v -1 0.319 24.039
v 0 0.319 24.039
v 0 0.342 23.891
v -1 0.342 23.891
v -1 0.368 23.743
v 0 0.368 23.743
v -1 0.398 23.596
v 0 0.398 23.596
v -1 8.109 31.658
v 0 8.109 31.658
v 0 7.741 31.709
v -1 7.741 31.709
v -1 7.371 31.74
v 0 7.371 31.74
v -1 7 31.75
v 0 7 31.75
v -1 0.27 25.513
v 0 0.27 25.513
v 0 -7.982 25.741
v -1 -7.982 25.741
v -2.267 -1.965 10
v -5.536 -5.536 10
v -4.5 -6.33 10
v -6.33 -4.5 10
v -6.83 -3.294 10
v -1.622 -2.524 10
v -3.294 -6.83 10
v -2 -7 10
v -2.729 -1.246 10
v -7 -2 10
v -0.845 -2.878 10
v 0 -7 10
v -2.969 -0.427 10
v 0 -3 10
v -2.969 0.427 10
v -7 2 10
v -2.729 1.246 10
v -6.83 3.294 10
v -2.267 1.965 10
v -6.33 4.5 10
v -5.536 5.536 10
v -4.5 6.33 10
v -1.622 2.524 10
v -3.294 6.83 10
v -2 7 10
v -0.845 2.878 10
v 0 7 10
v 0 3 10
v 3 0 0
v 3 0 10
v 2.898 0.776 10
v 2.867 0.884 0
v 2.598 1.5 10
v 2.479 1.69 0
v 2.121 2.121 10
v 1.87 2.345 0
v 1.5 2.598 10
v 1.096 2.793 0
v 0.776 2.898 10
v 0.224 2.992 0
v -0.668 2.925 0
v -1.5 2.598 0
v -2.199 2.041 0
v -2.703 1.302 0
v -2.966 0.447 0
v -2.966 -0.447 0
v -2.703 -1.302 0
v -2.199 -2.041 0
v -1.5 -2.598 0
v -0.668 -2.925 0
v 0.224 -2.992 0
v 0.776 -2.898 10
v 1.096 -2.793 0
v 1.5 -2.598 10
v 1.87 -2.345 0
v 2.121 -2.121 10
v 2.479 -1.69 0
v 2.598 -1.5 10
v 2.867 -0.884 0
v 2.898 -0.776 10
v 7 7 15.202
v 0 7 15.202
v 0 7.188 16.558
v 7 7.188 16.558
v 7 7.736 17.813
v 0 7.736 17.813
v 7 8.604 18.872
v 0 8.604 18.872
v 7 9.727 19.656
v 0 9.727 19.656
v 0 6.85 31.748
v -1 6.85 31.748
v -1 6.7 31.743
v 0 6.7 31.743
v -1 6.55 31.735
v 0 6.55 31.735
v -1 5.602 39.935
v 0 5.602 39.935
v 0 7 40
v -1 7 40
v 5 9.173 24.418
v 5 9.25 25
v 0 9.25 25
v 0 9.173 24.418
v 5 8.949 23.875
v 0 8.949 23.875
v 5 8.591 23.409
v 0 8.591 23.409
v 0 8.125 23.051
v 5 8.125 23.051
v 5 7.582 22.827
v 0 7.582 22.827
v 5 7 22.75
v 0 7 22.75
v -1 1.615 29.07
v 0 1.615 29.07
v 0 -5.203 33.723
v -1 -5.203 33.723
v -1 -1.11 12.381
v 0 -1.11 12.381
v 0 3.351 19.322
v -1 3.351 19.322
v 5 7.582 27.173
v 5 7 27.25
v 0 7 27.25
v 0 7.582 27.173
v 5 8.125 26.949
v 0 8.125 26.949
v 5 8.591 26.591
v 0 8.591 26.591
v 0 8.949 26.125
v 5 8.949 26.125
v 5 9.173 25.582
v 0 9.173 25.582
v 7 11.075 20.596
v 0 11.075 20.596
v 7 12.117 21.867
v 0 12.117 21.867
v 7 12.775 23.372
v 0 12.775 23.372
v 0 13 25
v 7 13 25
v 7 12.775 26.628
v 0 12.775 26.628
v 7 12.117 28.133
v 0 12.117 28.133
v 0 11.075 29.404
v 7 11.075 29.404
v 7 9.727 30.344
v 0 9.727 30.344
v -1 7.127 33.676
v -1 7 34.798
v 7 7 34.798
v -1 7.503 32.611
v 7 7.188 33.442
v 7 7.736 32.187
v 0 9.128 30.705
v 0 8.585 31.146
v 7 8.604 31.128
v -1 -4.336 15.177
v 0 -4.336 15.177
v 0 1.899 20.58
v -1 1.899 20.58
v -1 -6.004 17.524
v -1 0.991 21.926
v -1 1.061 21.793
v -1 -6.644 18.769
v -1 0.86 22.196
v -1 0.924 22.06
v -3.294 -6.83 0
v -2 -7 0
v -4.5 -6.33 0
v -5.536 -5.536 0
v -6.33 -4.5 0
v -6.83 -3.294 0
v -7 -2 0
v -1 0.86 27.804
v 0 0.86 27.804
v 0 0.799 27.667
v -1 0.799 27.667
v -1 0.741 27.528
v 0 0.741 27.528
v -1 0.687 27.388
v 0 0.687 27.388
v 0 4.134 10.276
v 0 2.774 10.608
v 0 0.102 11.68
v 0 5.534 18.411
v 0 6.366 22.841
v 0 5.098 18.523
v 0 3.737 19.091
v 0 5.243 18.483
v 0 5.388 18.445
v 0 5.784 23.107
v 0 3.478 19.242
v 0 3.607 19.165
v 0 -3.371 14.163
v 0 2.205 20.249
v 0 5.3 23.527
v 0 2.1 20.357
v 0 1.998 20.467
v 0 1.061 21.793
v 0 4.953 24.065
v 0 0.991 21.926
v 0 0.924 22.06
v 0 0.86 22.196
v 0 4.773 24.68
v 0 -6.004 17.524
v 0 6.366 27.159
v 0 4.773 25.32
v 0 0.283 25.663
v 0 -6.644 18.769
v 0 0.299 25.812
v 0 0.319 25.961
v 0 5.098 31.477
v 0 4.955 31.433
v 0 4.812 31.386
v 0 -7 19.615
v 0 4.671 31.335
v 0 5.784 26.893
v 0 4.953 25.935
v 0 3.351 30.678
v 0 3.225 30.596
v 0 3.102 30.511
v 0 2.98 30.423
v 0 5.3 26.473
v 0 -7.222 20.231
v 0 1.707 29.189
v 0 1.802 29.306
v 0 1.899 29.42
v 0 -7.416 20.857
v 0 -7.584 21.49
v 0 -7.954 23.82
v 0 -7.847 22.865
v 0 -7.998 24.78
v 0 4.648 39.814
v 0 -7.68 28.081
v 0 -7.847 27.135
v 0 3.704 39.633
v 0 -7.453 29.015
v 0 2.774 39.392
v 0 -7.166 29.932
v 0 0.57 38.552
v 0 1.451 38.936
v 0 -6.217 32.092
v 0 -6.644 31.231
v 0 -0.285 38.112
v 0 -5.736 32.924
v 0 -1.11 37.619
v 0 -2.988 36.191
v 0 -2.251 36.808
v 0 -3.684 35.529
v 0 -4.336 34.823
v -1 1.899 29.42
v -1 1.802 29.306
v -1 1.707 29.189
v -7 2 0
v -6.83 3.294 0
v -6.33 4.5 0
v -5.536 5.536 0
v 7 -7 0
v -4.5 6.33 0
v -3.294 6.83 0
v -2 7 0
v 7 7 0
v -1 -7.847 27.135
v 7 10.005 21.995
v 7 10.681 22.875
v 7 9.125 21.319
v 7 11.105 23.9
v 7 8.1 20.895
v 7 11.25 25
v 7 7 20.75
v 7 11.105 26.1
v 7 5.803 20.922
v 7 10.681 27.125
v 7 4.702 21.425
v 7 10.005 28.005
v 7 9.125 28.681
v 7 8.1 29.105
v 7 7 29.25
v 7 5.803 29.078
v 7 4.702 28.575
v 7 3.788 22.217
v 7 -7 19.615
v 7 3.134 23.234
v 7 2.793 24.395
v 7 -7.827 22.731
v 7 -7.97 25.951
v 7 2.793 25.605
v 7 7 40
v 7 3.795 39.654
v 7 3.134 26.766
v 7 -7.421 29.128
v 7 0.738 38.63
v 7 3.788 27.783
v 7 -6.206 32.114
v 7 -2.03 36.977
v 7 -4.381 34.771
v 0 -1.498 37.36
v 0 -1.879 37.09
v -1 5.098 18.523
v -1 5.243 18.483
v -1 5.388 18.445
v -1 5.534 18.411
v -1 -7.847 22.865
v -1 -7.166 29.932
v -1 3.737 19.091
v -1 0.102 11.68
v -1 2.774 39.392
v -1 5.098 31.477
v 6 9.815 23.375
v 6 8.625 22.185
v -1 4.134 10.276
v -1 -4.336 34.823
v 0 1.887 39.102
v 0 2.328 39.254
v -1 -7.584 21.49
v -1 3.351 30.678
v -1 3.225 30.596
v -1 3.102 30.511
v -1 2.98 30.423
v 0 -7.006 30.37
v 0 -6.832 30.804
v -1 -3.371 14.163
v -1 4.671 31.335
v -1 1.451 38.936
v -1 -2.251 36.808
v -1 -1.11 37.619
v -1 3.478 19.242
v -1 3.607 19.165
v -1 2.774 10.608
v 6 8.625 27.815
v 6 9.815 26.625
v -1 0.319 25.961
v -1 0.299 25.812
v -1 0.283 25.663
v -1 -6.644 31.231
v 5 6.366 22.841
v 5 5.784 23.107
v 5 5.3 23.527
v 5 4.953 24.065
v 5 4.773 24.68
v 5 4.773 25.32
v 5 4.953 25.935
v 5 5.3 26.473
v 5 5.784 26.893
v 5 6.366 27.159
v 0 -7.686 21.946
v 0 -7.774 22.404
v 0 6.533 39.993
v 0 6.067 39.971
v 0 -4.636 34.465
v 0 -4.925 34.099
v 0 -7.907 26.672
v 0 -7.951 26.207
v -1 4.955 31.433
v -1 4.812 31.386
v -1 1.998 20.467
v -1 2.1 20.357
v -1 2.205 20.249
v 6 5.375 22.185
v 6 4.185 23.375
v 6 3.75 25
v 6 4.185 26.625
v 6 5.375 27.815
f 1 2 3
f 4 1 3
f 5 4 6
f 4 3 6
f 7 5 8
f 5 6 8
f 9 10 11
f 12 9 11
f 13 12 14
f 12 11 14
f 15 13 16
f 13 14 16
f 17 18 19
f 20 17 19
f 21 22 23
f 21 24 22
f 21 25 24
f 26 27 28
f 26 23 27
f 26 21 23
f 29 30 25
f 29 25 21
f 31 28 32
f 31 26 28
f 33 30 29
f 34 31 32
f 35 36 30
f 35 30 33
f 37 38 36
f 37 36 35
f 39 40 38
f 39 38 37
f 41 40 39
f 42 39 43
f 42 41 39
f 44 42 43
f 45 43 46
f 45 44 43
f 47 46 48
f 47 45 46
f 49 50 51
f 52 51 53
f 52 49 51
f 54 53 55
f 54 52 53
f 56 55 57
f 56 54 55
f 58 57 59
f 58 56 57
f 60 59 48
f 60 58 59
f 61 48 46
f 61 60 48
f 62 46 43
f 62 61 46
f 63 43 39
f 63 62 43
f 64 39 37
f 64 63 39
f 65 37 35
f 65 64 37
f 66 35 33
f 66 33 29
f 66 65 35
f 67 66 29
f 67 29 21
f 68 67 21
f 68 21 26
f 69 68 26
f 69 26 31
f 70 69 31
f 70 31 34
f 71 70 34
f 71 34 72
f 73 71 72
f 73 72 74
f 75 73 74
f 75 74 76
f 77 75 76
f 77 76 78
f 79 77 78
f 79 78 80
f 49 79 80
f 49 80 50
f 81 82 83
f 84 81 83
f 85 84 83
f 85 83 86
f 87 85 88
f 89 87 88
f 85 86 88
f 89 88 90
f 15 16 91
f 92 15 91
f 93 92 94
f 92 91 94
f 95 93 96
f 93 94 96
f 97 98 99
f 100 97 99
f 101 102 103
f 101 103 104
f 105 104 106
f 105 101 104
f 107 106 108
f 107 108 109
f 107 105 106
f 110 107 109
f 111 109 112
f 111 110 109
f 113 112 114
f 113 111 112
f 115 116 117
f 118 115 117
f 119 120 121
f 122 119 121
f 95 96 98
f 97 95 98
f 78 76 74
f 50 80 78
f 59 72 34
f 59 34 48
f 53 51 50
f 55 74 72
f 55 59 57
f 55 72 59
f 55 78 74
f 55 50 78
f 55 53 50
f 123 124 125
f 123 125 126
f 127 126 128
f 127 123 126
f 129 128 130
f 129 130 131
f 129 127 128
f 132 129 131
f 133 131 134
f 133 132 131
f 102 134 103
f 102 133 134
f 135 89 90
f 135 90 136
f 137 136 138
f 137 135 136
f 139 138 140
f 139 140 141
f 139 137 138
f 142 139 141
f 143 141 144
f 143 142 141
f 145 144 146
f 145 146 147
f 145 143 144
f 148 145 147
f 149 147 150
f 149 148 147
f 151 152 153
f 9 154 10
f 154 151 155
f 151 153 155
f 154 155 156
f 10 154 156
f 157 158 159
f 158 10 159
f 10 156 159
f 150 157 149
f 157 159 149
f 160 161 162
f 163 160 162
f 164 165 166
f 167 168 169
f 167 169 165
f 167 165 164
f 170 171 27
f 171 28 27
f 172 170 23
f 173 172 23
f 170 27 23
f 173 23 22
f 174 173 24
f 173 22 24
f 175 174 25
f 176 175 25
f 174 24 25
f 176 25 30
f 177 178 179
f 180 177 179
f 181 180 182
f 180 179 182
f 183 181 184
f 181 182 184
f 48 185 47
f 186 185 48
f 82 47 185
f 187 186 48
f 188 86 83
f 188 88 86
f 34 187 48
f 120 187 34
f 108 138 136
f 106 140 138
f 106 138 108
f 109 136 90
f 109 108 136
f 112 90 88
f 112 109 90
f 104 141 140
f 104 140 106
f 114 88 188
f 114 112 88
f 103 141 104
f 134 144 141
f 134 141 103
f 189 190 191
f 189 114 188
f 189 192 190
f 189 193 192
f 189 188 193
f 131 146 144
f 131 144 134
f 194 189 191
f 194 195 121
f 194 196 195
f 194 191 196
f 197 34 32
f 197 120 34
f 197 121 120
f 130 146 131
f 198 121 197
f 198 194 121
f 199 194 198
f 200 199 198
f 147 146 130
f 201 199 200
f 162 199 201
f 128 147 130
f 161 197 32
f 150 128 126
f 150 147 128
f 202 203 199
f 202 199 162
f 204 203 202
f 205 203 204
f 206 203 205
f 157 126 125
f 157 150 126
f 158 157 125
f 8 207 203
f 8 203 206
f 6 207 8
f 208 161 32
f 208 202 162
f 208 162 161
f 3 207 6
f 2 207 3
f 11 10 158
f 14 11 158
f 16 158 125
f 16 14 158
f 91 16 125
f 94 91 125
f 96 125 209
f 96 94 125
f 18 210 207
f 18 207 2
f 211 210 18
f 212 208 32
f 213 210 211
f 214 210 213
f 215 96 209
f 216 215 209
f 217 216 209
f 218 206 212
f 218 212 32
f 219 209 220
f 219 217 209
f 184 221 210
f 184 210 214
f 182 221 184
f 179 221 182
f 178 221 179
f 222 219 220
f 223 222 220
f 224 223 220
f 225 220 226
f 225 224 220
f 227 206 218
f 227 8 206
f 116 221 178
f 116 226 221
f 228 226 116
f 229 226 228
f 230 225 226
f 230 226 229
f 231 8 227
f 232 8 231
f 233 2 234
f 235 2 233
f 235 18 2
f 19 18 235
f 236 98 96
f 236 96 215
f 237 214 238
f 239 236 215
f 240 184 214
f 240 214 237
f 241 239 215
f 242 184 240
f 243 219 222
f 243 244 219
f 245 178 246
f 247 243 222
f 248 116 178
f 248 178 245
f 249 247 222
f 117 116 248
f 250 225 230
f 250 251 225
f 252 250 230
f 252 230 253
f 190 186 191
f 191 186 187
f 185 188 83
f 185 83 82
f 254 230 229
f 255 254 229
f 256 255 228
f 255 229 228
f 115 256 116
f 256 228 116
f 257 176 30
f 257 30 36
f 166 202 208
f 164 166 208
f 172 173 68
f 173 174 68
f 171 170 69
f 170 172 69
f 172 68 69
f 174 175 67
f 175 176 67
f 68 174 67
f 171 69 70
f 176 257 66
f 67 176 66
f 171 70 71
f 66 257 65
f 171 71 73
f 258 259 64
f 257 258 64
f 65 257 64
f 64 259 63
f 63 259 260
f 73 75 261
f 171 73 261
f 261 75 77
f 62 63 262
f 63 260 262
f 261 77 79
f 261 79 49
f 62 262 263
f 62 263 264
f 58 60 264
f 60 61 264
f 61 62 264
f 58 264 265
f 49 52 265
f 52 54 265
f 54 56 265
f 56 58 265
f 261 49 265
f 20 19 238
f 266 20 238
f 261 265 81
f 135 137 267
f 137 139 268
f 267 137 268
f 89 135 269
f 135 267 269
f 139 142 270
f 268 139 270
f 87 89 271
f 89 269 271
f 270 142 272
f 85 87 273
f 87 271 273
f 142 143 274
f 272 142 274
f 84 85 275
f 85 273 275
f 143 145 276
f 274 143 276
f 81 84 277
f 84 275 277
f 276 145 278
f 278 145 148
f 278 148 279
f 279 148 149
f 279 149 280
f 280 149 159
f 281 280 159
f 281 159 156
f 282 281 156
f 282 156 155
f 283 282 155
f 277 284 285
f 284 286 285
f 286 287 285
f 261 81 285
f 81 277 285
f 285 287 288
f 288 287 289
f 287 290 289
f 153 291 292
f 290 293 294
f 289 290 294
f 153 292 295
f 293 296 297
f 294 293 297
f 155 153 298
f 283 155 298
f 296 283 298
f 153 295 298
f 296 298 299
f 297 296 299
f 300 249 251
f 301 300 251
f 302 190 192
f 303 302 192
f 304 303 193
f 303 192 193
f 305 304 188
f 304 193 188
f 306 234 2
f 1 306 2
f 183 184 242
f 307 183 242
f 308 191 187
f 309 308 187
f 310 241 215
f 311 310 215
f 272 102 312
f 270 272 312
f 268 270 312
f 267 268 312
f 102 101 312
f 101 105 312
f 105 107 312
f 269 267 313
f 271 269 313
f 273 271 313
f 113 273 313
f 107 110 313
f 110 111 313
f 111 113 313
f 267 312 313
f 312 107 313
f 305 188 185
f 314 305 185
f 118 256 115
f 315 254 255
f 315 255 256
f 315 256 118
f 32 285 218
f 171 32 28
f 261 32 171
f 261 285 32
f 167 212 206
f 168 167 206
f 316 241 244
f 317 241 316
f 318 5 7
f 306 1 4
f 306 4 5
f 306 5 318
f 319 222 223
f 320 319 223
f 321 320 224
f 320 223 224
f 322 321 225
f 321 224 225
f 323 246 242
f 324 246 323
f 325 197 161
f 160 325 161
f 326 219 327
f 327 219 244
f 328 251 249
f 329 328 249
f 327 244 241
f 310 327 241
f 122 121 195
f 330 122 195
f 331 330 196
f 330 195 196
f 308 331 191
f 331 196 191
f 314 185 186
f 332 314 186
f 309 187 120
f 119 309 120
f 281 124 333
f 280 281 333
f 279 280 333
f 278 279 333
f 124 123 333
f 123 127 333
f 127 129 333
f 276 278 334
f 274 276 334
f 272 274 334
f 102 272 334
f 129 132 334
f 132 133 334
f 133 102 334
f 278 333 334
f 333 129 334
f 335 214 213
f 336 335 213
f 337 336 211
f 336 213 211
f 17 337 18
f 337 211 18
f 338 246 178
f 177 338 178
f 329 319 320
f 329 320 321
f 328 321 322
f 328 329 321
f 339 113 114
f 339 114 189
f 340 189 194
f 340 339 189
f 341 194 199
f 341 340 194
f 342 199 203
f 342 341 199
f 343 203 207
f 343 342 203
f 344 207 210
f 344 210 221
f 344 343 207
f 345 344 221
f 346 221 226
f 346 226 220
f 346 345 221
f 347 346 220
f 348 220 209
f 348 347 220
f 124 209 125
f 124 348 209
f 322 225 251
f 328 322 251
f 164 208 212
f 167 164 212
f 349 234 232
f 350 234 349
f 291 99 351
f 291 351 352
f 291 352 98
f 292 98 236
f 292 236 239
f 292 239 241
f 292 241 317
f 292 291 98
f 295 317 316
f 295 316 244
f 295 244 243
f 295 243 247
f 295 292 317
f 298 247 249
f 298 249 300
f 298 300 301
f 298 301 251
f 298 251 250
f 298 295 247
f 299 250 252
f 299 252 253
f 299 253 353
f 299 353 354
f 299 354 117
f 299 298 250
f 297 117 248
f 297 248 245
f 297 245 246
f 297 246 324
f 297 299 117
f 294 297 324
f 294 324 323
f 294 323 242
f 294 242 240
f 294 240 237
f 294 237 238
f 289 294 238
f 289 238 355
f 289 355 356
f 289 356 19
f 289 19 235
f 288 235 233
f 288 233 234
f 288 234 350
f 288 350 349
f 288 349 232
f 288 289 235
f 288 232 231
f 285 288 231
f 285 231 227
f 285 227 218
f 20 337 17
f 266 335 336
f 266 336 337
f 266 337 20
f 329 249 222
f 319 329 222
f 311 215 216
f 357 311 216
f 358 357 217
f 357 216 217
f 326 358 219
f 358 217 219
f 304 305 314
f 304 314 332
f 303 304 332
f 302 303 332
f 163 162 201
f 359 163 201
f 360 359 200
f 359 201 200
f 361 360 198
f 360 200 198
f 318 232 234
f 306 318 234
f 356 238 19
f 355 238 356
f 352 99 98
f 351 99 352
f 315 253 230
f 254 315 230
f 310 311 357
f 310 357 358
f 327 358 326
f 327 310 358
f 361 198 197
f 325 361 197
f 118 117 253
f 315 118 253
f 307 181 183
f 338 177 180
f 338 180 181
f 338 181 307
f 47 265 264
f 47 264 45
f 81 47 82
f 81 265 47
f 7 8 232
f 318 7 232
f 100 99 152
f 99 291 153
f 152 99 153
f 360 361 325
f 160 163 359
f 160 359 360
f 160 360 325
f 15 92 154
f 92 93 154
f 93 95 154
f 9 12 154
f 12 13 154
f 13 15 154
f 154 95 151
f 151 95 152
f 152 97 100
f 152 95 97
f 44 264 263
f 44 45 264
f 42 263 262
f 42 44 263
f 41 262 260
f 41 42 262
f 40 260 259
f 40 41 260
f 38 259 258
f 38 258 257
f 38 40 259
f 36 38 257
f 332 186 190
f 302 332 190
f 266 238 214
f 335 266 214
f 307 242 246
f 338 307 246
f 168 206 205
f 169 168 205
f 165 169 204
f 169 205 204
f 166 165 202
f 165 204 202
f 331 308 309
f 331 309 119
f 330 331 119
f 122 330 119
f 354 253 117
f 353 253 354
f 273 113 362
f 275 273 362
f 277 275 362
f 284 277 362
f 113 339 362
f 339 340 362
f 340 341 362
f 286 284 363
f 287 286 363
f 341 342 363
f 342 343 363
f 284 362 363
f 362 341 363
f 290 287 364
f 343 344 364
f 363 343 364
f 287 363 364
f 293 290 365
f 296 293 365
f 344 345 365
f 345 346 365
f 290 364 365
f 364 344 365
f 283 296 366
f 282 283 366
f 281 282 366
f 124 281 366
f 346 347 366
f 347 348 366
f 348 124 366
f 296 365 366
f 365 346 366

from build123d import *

# Parameters (mm, degrees)
F0_W         = 14
F0_H         = 14
F0_R         = 3
F1_DEPTH     = 10
F3_DEPTH     = 7
F5_DEPTH     = 1
F6_T1_DEPTH  = 7
F6_T6_DEPTH  = 7
F6_S7_R      = 6.75
F6_T8_DEPTH  = 6
F6_T12_DEPTH = 7
F6_S13_R     = 6.75
F6_T14_DEPTH = 6
F6_T18_DEPTH = 16.4948974278
F6_S20_R     = 6.75
F6_T21_DEPTH = 10
F7_R         = 5
F8_SIZE      = 2


# Not quite as in the source:
# - a fillet or chamfer that OpenCascade refuses, or shapes differently, is made with other operations: its cross-section is extruded or revolved along the edge and cut away or added


with BuildPart() as f1:
    # F0 (on Top) → F1 (new body)
    with BuildSketch(Plane.XY):
        Rectangle(F0_W, F0_H)
        Circle(F0_R, mode=Mode.SUBTRACT)
    extrude(amount=F1_DEPTH)

    # F2 (on face) → F3 (join)
    with BuildSketch(Plane.YZ.offset(7)):
        with BuildLine():
            Line((7, 31), (7, 40))
            ThreePointArc((7, 40), (-5.3648184804, 33.4918351342), (-7, 19.6148351929))
            ThreePointArc((-7, 19.6148351929), (-1.4918351342, 12.6351815196), (7, 10))
            Line((7, 10), (7, 19))
            Line((7, 19), (7, 22.75))
            ThreePointArc((7, 22.75), (4.75, 25), (7, 27.25))
            Line((7, 27.25), (7, 31))
        make_face()
        with BuildLine():
            ThreePointArc((7, 19), (13, 25), (7, 31))
            Line((7, 31), (7, 27.25))
            ThreePointArc((7, 27.25), (8.5909902577, 26.5909902577), (9.25, 25))
            ThreePointArc((9.25, 25), (8.5909902577, 23.4090097423), (7, 22.75))
            Line((7, 22.75), (7, 19))
        make_face()
        with BuildLine():
            ThreePointArc((7, 10), (-1.4918351342, 12.6351815196), (-7, 19.6148351929))
            Line((-7, 19.6148351929), (-7, 10))
            Line((-7, 10), (7, 10))
        make_face()
    extrude(amount=-F3_DEPTH)

    # F4 (on face) → F5 (join)
    with BuildSketch(Plane(origin=(0, 0, 0), x_dir=(0, -1, 0), z_dir=(-1, 0, 0))):
        with BuildLine():
            Line((-5.6015252753, 39.9346666667), (-7, 40))
            Line((-7, 40), (-7, 31.75))
            ThreePointArc((-7, 31.75), (-6.7748747563, 31.7462447795), (-6.55, 31.7349832962))
            Line((-6.55, 31.7349832962), (-5.6015252753, 39.9346666667))
        make_face()
        with BuildLine():
            Line((-1.4505915023, 38.9357118701), (-2.7740116474, 39.3923946042))
            Line((-2.7740116474, 39.3923946042), (-5.0983052413, 31.4765775719))
            ThreePointArc((-5.0983052413, 31.4765775719), (-4.8833571197, 31.4095493537), (-4.6707640976, 31.3353894995))
            Line((-4.6707640976, 31.3353894995), (-1.4505915023, 38.9357118701))
        make_face()
        with BuildLine():
            Line((2.2507621978, 36.8077685766), (1.1096122618, 37.6188029925))
            Line((1.1096122618, 37.6188029925), (-3.3506744822, 30.6784613466))
            ThreePointArc((-3.3506744822, 30.6784613466), (-3.1633173011, 30.5535903583), (-2.9802290354, 30.4225401236))
            Line((-2.9802290354, 30.4225401236), (2.2507621978, 36.8077685766))
        make_face()
        with BuildLine():
            Line((5.2026741611, 33.7232300966), (4.3362436153, 34.8229110092))
            Line((4.3362436153, 34.8229110092), (-1.8986903731, 29.4203099541))
            ThreePointArc((-1.8986903731, 29.4203099541), (-1.7541026971, 29.2477125006), (-1.6153519103, 29.070388796))
            Line((-1.6153519103, 29.070388796), (5.2026741611, 33.7232300966))
        make_face()
        with BuildLine():
            Line((7.1659980359, 29.9319873933), (6.6444799303, 31.231225195))
            Line((6.6444799303, 31.231225195), (-0.8599840314, 27.8040513378))
            ThreePointArc((-0.8599840314, 27.8040513378), (-0.7698794941, 27.5977102382), (-0.6867069498, 27.3884787756))
            Line((-0.6867069498, 27.3884787756), (7.1659980359, 29.9319873933))
        make_face()
        with BuildLine():
            Line((7.9816769983, 25.7411844029), (7.8473216282, 27.1347225741))
            Line((7.8473216282, 27.1347225741), (-0.3187052673, 25.9606251583))
            ThreePointArc((-0.3187052673, 25.9606251583), (-0.2903836024, 25.7372569414), (-0.2695274455, 25.5130684097))
            Line((-0.2695274455, 25.5130684097), (7.9816769983, 25.7411844029))
        make_face()
        with BuildLine():
            Line((-0.3976107999, 23.5960922926), (7.5836295897, 21.4903350603))
            Line((7.5836295897, 21.4903350603), (7.8473216282, 22.8652774259))
            Line((7.8473216282, 22.8652774259), (-0.3187052673, 24.0393748417))
            ThreePointArc((-0.3187052673, 24.0393748417), (-0.3544609277, 23.8170754719), (-0.3976107999, 23.5960922926))
        make_face()
        with BuildLine():
            ThreePointArc((-0.8599840314, 22.1959486622), (-0.9569203061, 21.9927275126), (-1.0605804615, 21.7928524285))
            Line((-1.0605804615, 21.7928524285), (6.004103244, 17.5238178982))
            Line((6.004103244, 17.5238178982), (6.6444799303, 18.768774805))
            Line((6.6444799303, 18.768774805), (-0.8599840314, 22.1959486622))
        make_face()
        with BuildLine():
            ThreePointArc((-1.8986903731, 20.5796900459), (-2.0489540617, 20.4120108852), (-2.2047265709, 20.2494365871))
            Line((-2.2047265709, 20.2494365871), (3.3710617919, 14.1629765475))
            Line((3.3710617919, 14.1629765475), (4.3362436153, 15.1770889908))
            Line((4.3362436153, 15.1770889908), (-1.8986903731, 20.5796900459))
        make_face()
        with BuildLine():
            ThreePointArc((-3.3506744822, 19.3215386534), (-3.5420921143, 19.2029858501), (-3.737357215, 19.0908831407))
            Line((-3.737357215, 19.0908831407), (-0.1021814076, 11.6800863867))
            Line((-0.1021814076, 11.6800863867), (1.1096122618, 12.3811970075))
            Line((1.1096122618, 12.3811970075), (-3.3506744822, 19.3215386534))
        make_face()
        with BuildLine():
            ThreePointArc((-5.0983052413, 18.5234224281), (-5.3153692987, 18.4636004253), (-5.5343077738, 18.4110511993))
            Line((-5.5343077738, 18.4110511993), (-4.1342448465, 10.2762964102))
            Line((-4.1342448465, 10.2762964102), (-2.7740116474, 10.6076053958))
            Line((-2.7740116474, 10.6076053958), (-5.0983052413, 18.5234224281))
        make_face()
    extrude(amount=F5_DEPTH)

    # F6: fillet of radius 5 on 2 edges, made by hand

    # F6_s2 → F6_t1 (join)
    with BuildSketch(Plane.YZ):
        with BuildLine():
            ThreePointArc((7, 15.2020410289), (7.7359856729, 17.8132058682), (9.7272727273, 19.655658743))
            ThreePointArc((9.7272727273, 19.655658743), (8.4024892973, 19.1662170274), (7, 19))
            Line((7, 19), (7, 15.2020410289))
        make_face()
    extrude(amount=F6_T1_DEPTH)


with BuildPart() as f6_tool4:
    # F6_s5 → F6_t6 (new body)
    with BuildSketch(Plane.YZ.offset(7)):
        with BuildLine():
            ThreePointArc((7, 34.7979589711), (7.7359856729, 32.1867941318), (9.7272727273, 30.344341257))
            ThreePointArc((9.7272727273, 30.344341257), (8.4024892973, 30.8337829726), (7, 31))
            Line((7, 31), (7, 34.7979589711))
        make_face()
    extrude(amount=-F6_T6_DEPTH)

    # F6_s7 → F6_t8 (cut, symmetric)
    with BuildSketch(Plane.YZ.offset(3.5)):
        with Locations((7, 25)):
            Circle(F6_S7_R)
    extrude(amount=F6_T8_DEPTH, both=True, mode=Mode.SUBTRACT)


with BuildPart() as f1_1:
    add(f1.part)

    # F6_t3: union F6_tool4
    add(f6_tool4.part)


with BuildPart() as f6_tool10:
    # F6_s11 → F6_t12 (new body)
    with BuildSketch(Plane.YZ.offset(7)):
        with BuildLine():
            ThreePointArc((7, 34.7979589711), (7.7359856729, 32.1867941318), (9.7272727273, 30.344341257))
            ThreePointArc((9.7272727273, 30.344341257), (8.4024892973, 30.8337829726), (7, 31))
            Line((7, 31), (7, 34.7979589711))
        make_face()
    extrude(amount=-F6_T12_DEPTH)

    # F6_s13 → F6_t14 (intersect, symmetric)
    with BuildSketch(Plane.YZ.offset(3.5)):
        with Locations((7, 25)):
            Circle(F6_S13_R)
    extrude(amount=F6_T14_DEPTH, both=True, mode=Mode.INTERSECT)


with BuildPart() as f1_2:
    add(f1_1.part)

    # F6_t9: union F6_tool10
    add(f6_tool10.part)


with BuildPart() as f6_tool16:
    # F6_s17 → F6_t18 (new body)
    with BuildSketch(Plane.YZ.offset(7)):
        with BuildLine():
            ThreePointArc((7, 34.7979589711), (7.7359856729, 32.1867941318), (9.7272727273, 30.344341257))
            ThreePointArc((9.7272727273, 30.344341257), (8.4024892973, 30.8337829726), (7, 31))
            Line((7, 31), (7, 34.7979589711))
        make_face()
    extrude(amount=-F6_T18_DEPTH)

    split(bisect_by=Plane.YZ, keep=Keep.BOTTOM)

    # F6_s20 → F6_t21 (cut, symmetric)
    with BuildSketch(Plane.YZ.offset(-1.2)):
        with Locations((7, 25)):
            Circle(F6_S20_R)
    extrude(amount=F6_T21_DEPTH, both=True, mode=Mode.SUBTRACT)

    split(bisect_by=Plane.YZ.offset(-1), keep=Keep.TOP)


with BuildPart() as f1_3:
    add(f1_2.part)

    # F6_t15: union F6_tool16
    add(f6_tool16.part)

    # F7
    f7_edges = [f1_3.edges().sort_by_distance(p)[0] for p in [
        (-7, 7, 5),
        (-7, -7, 5),
    ]]
    fillet(f7_edges, radius=F7_R)

    # F8
    f8_edges = [f1_3.edges().sort_by_distance(p)[0] for p in [
        (7, 7, 22.75),
    ]]
    chamfer(f8_edges, length=F8_SIZE)


solid = f1_3.part
